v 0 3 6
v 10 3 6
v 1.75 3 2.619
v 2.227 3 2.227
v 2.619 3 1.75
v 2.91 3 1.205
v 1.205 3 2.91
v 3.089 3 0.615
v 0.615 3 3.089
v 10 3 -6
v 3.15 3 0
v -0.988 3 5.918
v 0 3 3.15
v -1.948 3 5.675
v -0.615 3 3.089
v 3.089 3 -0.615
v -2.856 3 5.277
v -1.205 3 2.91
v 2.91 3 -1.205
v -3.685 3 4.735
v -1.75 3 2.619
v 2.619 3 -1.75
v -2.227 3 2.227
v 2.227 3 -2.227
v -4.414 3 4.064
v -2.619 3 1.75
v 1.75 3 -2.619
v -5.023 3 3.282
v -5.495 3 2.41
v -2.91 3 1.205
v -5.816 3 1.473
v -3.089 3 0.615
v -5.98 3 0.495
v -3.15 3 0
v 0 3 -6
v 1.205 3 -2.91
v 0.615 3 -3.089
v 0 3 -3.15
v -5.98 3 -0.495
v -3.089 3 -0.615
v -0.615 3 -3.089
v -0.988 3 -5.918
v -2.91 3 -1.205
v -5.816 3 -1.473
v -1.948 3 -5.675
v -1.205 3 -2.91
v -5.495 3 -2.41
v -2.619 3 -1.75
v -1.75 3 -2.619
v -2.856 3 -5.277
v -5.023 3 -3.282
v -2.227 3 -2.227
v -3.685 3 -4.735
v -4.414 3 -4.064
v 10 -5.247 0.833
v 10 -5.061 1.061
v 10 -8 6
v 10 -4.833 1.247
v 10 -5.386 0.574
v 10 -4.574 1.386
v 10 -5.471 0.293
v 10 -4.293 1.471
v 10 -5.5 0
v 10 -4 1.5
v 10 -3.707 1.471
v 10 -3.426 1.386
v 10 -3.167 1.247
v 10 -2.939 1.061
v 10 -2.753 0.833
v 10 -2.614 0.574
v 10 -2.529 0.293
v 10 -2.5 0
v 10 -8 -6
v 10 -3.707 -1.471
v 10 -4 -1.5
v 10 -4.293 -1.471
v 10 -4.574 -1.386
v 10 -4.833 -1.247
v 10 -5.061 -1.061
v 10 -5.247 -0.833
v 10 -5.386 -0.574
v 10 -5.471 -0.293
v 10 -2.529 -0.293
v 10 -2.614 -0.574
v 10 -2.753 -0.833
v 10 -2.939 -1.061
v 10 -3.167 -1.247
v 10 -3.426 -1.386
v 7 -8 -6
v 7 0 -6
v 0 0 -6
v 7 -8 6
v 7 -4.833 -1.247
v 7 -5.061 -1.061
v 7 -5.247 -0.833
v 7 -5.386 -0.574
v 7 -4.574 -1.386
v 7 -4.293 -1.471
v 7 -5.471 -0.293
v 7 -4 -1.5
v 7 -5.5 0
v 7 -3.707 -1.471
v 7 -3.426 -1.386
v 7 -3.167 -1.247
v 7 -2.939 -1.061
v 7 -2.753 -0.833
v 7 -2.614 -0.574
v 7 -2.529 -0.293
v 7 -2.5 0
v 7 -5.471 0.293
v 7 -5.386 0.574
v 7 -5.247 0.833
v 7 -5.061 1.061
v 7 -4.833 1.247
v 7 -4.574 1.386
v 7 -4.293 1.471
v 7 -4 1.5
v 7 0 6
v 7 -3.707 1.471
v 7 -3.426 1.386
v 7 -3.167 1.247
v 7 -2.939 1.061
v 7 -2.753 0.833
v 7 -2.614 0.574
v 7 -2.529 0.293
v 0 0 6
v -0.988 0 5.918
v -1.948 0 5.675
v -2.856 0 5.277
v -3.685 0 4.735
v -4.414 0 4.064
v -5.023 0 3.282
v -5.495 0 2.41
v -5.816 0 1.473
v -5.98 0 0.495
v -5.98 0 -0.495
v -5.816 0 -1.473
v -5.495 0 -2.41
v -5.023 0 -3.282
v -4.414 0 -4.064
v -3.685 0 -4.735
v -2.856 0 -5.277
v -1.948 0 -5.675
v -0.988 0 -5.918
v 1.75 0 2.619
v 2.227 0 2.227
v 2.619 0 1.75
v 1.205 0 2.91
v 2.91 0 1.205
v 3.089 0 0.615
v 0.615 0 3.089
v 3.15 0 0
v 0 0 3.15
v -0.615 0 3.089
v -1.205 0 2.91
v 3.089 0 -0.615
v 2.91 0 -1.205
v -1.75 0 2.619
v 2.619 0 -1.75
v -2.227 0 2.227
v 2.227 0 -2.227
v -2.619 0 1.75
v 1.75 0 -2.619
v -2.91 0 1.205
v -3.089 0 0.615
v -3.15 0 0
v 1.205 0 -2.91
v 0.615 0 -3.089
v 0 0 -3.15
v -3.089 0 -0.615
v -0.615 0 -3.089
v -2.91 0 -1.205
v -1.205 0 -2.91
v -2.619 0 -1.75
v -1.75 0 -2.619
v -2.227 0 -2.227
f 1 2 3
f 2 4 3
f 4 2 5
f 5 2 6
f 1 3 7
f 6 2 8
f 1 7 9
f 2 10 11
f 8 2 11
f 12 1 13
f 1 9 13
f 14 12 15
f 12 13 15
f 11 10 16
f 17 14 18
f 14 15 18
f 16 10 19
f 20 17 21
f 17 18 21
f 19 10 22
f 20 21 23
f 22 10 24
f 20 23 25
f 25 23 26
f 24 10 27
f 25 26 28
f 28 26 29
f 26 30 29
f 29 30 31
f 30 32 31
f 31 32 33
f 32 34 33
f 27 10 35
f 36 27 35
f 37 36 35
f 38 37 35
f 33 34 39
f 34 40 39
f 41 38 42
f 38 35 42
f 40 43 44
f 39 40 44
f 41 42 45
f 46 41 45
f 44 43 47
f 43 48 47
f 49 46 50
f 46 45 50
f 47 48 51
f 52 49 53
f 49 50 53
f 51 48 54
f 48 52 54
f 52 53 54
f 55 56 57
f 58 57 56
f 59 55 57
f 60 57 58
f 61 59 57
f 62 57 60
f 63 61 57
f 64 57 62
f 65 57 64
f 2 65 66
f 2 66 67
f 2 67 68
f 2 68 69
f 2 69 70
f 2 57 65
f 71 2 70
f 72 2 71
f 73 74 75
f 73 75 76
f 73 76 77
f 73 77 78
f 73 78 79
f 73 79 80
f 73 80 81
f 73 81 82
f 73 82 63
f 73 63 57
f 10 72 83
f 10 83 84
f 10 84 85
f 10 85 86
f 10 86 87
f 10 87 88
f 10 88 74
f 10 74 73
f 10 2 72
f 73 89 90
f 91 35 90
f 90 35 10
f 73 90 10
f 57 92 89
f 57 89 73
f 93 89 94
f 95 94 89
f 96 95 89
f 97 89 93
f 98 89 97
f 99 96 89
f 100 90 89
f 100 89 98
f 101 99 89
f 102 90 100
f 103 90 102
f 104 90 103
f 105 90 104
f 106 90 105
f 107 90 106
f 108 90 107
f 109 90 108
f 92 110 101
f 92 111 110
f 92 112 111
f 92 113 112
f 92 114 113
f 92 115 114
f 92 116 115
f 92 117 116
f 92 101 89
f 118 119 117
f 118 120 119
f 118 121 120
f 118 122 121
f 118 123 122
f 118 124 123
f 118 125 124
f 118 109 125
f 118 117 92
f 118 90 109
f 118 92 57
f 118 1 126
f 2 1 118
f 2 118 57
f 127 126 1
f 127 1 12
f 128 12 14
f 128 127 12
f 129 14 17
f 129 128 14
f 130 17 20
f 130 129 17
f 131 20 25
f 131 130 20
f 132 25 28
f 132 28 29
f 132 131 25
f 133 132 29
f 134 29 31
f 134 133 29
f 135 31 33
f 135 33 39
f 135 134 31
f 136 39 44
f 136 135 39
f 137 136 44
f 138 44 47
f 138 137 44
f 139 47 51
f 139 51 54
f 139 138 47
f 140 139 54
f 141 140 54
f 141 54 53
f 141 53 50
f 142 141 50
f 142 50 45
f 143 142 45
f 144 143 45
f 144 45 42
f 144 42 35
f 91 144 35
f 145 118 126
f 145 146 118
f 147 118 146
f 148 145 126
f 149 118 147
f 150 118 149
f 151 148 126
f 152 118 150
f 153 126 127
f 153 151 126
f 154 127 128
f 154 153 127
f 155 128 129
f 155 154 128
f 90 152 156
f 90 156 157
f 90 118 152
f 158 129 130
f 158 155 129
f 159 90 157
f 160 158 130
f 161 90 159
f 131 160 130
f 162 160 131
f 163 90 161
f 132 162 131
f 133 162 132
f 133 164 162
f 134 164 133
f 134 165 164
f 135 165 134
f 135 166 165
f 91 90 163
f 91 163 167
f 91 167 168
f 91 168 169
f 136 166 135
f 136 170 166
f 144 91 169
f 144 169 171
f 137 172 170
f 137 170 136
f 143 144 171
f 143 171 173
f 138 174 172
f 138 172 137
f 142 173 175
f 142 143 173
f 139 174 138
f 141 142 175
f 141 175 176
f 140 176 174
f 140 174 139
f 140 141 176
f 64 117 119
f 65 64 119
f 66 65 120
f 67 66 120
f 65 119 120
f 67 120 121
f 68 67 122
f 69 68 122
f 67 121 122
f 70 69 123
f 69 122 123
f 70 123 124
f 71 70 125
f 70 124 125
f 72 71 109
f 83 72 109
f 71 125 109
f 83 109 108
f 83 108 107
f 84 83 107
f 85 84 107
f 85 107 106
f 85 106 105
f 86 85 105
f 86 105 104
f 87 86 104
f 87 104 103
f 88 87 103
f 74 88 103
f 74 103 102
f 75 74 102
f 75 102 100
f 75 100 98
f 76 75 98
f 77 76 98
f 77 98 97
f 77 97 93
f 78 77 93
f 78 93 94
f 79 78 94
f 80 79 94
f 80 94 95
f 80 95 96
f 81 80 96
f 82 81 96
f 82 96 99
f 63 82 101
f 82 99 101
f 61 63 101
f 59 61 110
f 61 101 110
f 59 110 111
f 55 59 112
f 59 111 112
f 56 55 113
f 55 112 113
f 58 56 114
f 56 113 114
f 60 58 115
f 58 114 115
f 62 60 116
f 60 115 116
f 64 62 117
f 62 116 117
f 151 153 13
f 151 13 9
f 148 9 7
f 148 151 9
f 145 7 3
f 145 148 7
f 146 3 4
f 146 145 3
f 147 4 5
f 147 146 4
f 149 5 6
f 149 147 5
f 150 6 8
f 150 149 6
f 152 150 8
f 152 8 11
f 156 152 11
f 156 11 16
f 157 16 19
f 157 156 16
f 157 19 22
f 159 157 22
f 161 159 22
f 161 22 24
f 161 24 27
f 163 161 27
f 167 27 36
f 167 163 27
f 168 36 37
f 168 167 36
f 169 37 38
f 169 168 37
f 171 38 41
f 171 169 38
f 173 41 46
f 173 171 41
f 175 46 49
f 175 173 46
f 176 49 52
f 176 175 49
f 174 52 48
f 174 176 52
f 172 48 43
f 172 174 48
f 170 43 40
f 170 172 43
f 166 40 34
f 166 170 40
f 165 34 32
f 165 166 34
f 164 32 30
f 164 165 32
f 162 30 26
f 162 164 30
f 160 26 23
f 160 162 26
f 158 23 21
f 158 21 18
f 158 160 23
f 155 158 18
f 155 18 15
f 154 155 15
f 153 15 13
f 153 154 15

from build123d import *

# Parameters (mm, degrees)
SKETCH2_R           = 3.15
BOSS_EXTRUDE1_DEPTH = 3
SKETCH2_3_W         = 3
SKETCH2_3_H         = 12
BOSS_EXTRUDE2_DEPTH = 8
SKETCH4_R           = 1.5
CUT_EXTRUDE1_DEPTH  = 17.401219467


with BuildPart() as part:
    # Sketch2 → Boss-Extrude1 (new body)
    with BuildSketch(Plane(origin=(0, 0, 0), x_dir=(1, 0, 0), z_dir=(0, 1, 0))):
        with BuildLine():
            Line((0, -6), (10, -6))
            Line((10, -6), (10, 6))
            Line((10, 6), (0, 6))
            ThreePointArc((0, 6), (-6, 0), (0, -6))
        make_face()
        Circle(SKETCH2_R, mode=Mode.SUBTRACT)
    extrude(amount=BOSS_EXTRUDE1_DEPTH)

    # Sketch2<3> → Boss-Extrude2 (add)
    with BuildSketch(Plane(origin=(0, 0, 0), x_dir=(1, 0, 0), z_dir=(0, 1, 0))):
        with Locations((8.5, 0)):
            Rectangle(SKETCH2_3_W, SKETCH2_3_H)
    extrude(amount=-BOSS_EXTRUDE2_DEPTH)

    # Sketch4 → Cut-Extrude1 (cut, through all)
    with BuildSketch(Plane.ZY.offset(-7)):
        with Locations((0, -4)):
            Circle(SKETCH4_R)
    extrude(amount=-CUT_EXTRUDE1_DEPTH, mode=Mode.SUBTRACT)


solid = part.part
